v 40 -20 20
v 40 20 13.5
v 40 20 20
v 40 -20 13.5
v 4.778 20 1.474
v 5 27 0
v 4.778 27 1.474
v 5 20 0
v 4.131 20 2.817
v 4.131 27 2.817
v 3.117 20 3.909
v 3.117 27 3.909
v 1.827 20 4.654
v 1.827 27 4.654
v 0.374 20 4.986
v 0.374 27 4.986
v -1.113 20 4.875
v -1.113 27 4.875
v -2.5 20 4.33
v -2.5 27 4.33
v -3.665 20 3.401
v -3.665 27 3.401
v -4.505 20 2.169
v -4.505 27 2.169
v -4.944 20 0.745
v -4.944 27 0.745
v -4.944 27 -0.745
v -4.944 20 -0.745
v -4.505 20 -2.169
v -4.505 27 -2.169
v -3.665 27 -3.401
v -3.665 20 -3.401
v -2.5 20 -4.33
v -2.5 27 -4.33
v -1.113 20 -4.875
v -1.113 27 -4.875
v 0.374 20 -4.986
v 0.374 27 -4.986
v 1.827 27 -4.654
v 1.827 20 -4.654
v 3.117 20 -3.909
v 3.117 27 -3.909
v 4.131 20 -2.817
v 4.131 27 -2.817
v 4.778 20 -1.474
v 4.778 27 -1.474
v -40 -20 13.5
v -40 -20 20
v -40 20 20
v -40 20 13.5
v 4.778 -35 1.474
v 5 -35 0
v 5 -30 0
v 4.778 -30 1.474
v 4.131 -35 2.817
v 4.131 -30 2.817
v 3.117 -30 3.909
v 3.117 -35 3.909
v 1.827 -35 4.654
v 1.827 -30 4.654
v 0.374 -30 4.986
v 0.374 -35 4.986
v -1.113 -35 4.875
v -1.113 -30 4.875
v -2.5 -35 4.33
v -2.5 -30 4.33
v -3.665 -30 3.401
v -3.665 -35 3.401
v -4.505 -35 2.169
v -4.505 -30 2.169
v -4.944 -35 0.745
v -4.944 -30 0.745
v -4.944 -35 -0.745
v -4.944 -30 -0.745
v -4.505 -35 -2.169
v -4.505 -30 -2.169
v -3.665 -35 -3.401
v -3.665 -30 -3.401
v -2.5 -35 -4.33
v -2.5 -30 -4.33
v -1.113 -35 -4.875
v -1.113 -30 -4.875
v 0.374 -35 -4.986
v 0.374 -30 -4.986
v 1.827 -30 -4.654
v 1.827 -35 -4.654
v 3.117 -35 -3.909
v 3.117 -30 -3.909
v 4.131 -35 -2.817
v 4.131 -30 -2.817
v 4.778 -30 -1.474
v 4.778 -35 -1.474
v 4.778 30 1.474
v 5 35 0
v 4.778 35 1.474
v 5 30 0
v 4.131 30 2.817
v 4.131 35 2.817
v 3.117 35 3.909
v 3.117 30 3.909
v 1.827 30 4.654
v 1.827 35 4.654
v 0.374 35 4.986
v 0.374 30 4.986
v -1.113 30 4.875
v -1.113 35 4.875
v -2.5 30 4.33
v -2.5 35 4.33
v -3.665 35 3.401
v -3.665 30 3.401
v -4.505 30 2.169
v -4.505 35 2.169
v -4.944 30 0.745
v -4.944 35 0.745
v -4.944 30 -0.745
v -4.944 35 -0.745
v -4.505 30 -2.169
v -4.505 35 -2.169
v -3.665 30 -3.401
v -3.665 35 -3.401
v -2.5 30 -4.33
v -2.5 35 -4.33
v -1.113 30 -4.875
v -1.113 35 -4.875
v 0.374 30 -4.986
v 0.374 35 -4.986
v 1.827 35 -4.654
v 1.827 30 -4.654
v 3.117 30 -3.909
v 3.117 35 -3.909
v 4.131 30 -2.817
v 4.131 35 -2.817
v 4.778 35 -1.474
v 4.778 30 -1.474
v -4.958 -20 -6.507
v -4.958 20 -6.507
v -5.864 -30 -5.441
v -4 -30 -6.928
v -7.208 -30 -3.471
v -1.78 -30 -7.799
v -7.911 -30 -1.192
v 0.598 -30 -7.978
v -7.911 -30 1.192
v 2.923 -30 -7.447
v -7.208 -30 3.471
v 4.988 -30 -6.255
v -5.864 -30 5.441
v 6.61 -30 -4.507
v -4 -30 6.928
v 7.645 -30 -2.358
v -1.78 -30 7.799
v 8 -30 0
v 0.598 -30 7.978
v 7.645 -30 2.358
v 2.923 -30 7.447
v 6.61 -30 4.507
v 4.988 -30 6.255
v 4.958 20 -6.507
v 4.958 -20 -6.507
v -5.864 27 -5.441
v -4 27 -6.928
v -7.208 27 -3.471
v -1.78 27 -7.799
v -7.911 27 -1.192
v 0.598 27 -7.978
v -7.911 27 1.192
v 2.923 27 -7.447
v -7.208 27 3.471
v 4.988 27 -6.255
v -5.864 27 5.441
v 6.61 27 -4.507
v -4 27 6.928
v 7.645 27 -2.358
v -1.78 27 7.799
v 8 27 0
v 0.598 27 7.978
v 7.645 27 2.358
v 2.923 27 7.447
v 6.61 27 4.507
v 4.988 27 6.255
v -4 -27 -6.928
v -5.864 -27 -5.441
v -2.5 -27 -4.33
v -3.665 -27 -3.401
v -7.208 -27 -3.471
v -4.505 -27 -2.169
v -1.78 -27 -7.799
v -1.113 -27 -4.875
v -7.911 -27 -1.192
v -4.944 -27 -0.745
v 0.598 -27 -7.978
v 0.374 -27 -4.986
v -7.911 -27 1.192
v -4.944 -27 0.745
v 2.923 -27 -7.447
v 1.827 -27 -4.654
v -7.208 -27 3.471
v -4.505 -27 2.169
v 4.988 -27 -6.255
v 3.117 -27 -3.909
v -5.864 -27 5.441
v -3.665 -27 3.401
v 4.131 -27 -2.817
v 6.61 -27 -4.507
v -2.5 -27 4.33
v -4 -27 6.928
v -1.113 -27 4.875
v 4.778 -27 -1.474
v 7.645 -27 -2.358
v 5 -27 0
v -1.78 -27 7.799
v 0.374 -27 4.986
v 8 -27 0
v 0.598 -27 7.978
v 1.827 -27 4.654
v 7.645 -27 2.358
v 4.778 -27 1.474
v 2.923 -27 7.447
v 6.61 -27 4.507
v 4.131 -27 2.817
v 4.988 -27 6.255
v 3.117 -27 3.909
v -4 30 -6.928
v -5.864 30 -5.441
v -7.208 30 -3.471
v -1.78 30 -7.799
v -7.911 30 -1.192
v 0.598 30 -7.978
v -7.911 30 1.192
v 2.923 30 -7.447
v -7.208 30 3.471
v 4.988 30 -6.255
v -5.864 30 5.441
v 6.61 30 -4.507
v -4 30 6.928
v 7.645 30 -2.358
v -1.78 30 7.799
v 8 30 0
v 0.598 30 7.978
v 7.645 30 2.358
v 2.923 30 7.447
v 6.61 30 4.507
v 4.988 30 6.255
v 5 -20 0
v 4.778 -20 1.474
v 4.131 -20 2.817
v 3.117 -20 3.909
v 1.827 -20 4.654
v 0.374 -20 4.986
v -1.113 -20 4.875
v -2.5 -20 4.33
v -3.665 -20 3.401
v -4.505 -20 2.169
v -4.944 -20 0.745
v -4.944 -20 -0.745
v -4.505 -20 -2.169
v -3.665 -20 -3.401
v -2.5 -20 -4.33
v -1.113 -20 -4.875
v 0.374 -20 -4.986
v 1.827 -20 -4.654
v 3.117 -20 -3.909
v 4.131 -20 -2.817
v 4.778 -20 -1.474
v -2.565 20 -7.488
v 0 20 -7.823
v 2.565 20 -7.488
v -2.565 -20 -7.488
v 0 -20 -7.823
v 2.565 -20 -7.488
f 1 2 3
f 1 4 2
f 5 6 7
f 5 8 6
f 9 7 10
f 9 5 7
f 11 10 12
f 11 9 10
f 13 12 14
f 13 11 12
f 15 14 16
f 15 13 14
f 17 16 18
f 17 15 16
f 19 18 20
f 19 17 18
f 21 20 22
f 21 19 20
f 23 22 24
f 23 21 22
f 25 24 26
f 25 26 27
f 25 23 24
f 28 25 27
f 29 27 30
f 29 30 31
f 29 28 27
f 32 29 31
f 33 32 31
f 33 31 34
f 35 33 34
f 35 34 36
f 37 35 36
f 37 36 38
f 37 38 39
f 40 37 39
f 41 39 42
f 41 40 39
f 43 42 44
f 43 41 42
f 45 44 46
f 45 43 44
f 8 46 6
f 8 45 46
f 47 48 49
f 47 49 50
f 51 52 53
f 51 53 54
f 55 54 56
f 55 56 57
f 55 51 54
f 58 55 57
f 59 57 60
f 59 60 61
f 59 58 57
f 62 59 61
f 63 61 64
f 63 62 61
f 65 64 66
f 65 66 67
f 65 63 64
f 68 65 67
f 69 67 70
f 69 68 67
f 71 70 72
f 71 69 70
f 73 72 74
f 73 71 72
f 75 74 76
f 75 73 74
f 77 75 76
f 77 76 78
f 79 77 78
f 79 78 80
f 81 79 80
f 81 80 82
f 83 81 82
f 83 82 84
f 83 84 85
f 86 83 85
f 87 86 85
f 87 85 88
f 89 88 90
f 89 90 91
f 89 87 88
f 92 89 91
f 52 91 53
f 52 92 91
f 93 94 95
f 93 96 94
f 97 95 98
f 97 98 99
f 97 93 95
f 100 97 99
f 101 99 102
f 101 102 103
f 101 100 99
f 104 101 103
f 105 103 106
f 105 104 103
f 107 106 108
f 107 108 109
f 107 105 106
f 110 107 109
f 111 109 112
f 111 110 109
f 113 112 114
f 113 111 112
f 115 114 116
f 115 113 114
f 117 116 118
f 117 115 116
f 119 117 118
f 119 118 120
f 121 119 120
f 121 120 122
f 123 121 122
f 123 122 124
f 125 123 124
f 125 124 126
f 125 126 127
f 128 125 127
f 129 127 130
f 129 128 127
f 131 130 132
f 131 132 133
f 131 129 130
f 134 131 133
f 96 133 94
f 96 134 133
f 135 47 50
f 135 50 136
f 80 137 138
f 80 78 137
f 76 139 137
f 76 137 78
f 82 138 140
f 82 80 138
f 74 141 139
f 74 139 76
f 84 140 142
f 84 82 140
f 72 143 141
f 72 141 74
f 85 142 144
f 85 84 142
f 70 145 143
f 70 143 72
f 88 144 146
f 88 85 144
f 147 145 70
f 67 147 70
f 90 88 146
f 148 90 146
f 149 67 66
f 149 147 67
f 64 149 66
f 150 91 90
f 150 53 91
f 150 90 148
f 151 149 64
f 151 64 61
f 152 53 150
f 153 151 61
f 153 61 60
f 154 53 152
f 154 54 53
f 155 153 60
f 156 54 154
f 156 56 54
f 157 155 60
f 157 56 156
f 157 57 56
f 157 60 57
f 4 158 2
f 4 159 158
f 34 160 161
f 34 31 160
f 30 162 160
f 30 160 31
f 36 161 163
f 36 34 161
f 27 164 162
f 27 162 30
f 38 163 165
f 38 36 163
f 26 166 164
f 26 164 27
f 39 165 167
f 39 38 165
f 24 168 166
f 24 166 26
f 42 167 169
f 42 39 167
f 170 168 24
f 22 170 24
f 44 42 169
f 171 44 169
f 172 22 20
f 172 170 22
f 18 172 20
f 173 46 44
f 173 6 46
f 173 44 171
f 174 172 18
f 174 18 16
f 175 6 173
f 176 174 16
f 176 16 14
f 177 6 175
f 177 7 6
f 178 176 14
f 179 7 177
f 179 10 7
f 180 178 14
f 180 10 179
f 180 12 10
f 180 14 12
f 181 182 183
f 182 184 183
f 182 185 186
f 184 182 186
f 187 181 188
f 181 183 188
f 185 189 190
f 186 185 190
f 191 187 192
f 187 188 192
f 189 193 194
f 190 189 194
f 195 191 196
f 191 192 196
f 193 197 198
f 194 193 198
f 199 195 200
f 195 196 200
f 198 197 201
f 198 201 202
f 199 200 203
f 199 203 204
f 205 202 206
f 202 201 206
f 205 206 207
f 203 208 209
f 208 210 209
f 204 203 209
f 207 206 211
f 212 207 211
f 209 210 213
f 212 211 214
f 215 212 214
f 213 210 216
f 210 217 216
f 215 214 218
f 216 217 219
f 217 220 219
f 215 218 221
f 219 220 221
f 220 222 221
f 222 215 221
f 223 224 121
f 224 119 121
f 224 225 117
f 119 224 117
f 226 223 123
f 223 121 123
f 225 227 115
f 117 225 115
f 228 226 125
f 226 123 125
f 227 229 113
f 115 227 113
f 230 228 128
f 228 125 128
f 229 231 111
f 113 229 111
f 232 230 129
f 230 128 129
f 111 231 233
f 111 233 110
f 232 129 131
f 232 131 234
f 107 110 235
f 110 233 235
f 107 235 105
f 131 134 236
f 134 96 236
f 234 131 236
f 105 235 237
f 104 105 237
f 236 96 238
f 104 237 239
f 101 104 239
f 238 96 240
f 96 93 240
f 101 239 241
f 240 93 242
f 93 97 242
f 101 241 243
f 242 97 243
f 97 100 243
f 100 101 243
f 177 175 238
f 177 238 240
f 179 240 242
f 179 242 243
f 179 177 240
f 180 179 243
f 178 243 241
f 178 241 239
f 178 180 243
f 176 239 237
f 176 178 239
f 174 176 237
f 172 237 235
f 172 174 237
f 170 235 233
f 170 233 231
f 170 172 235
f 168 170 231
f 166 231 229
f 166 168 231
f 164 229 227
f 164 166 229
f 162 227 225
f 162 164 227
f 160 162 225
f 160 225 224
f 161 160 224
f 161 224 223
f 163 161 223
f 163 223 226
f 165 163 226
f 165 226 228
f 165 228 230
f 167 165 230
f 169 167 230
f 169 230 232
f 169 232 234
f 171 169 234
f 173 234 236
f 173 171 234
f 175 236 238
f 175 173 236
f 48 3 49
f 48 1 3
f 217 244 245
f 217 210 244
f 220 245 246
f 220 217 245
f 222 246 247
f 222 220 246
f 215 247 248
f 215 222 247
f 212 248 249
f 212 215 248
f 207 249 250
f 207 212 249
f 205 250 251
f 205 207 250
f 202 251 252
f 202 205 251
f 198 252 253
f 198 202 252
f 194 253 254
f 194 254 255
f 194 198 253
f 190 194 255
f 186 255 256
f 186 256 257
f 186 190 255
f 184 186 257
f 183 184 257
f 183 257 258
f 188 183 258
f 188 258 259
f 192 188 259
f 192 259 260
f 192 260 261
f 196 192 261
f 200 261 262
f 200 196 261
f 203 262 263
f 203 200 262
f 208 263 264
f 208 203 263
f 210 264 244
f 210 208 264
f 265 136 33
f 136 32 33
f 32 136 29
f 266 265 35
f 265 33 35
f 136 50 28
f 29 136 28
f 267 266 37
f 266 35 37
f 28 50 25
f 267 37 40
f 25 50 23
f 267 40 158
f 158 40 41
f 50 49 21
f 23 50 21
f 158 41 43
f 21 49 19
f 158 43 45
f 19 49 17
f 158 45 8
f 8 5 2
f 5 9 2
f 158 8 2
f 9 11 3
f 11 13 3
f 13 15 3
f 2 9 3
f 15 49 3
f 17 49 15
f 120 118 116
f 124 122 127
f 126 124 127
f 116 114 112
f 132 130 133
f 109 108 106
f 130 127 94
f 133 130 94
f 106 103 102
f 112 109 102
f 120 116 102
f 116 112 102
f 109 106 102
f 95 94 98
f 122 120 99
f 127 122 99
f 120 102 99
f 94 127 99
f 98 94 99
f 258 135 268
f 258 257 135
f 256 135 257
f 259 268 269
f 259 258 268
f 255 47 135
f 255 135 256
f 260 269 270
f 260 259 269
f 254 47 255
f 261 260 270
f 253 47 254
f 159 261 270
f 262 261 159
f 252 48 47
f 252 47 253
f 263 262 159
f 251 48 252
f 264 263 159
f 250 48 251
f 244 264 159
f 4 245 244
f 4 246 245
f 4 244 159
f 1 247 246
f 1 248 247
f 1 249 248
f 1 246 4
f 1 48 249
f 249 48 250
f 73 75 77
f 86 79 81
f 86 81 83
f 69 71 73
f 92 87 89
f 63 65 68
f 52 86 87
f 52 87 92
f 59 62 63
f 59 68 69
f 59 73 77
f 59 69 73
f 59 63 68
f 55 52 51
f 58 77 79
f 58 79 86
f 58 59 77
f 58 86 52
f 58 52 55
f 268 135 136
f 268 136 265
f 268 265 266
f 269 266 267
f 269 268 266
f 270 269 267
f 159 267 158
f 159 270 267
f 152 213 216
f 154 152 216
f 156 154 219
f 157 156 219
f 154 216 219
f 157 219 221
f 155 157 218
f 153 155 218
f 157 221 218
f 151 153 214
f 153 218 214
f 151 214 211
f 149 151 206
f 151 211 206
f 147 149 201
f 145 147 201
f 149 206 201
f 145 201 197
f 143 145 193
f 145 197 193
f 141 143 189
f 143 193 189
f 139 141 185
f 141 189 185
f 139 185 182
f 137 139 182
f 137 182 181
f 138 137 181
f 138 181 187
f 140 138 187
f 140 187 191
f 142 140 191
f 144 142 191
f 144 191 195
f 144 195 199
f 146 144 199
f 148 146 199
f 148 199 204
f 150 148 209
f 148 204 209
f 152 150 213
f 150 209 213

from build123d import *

# Parameters (mm, degrees)
F0_R     = 5
F1_DEPTH = 20
F2_DEPTH = 35
F4_R     = 8
F5_DEPTH = 3


with BuildPart() as f1:
    # F0 (on Front) → F1 (new body, symmetric)
    with BuildSketch(Plane.XZ):
        with BuildLine():
            Line((40, 20), (0, 20))
            Line((0, 20), (-40, 20))
            Line((-40, 20), (-40, 13.5))
            Line((-40, 13.5), (-4.9582247647, -6.5069341219))
            ThreePointArc((-4.9582247647, -6.5069341219), (0, -7.822695112), (4.9582247647, -6.5069341219))
            Line((4.9582247647, -6.5069341219), (40, 13.5))
            Line((40, 13.5), (40, 20))
        make_face()
        Circle(F0_R, mode=Mode.SUBTRACT)
    extrude(amount=F1_DEPTH, both=True)

    # F0 (on Front) → F2 (join, symmetric)
    with BuildSketch(Plane.XZ):
        Circle(F0_R)
    extrude(amount=F2_DEPTH, both=True)

    # F4 (on offset) → F5 (join)
    with BuildSketch(Plane.XZ.offset(27)):
        Circle(F4_R)
    extrude(amount=F5_DEPTH)

    # F6: F1 across plane


with BuildPart() as f1_1:
    add(f1.part)
    add(f1.part.mirror(Plane.XZ))


solid = f1_1.part
